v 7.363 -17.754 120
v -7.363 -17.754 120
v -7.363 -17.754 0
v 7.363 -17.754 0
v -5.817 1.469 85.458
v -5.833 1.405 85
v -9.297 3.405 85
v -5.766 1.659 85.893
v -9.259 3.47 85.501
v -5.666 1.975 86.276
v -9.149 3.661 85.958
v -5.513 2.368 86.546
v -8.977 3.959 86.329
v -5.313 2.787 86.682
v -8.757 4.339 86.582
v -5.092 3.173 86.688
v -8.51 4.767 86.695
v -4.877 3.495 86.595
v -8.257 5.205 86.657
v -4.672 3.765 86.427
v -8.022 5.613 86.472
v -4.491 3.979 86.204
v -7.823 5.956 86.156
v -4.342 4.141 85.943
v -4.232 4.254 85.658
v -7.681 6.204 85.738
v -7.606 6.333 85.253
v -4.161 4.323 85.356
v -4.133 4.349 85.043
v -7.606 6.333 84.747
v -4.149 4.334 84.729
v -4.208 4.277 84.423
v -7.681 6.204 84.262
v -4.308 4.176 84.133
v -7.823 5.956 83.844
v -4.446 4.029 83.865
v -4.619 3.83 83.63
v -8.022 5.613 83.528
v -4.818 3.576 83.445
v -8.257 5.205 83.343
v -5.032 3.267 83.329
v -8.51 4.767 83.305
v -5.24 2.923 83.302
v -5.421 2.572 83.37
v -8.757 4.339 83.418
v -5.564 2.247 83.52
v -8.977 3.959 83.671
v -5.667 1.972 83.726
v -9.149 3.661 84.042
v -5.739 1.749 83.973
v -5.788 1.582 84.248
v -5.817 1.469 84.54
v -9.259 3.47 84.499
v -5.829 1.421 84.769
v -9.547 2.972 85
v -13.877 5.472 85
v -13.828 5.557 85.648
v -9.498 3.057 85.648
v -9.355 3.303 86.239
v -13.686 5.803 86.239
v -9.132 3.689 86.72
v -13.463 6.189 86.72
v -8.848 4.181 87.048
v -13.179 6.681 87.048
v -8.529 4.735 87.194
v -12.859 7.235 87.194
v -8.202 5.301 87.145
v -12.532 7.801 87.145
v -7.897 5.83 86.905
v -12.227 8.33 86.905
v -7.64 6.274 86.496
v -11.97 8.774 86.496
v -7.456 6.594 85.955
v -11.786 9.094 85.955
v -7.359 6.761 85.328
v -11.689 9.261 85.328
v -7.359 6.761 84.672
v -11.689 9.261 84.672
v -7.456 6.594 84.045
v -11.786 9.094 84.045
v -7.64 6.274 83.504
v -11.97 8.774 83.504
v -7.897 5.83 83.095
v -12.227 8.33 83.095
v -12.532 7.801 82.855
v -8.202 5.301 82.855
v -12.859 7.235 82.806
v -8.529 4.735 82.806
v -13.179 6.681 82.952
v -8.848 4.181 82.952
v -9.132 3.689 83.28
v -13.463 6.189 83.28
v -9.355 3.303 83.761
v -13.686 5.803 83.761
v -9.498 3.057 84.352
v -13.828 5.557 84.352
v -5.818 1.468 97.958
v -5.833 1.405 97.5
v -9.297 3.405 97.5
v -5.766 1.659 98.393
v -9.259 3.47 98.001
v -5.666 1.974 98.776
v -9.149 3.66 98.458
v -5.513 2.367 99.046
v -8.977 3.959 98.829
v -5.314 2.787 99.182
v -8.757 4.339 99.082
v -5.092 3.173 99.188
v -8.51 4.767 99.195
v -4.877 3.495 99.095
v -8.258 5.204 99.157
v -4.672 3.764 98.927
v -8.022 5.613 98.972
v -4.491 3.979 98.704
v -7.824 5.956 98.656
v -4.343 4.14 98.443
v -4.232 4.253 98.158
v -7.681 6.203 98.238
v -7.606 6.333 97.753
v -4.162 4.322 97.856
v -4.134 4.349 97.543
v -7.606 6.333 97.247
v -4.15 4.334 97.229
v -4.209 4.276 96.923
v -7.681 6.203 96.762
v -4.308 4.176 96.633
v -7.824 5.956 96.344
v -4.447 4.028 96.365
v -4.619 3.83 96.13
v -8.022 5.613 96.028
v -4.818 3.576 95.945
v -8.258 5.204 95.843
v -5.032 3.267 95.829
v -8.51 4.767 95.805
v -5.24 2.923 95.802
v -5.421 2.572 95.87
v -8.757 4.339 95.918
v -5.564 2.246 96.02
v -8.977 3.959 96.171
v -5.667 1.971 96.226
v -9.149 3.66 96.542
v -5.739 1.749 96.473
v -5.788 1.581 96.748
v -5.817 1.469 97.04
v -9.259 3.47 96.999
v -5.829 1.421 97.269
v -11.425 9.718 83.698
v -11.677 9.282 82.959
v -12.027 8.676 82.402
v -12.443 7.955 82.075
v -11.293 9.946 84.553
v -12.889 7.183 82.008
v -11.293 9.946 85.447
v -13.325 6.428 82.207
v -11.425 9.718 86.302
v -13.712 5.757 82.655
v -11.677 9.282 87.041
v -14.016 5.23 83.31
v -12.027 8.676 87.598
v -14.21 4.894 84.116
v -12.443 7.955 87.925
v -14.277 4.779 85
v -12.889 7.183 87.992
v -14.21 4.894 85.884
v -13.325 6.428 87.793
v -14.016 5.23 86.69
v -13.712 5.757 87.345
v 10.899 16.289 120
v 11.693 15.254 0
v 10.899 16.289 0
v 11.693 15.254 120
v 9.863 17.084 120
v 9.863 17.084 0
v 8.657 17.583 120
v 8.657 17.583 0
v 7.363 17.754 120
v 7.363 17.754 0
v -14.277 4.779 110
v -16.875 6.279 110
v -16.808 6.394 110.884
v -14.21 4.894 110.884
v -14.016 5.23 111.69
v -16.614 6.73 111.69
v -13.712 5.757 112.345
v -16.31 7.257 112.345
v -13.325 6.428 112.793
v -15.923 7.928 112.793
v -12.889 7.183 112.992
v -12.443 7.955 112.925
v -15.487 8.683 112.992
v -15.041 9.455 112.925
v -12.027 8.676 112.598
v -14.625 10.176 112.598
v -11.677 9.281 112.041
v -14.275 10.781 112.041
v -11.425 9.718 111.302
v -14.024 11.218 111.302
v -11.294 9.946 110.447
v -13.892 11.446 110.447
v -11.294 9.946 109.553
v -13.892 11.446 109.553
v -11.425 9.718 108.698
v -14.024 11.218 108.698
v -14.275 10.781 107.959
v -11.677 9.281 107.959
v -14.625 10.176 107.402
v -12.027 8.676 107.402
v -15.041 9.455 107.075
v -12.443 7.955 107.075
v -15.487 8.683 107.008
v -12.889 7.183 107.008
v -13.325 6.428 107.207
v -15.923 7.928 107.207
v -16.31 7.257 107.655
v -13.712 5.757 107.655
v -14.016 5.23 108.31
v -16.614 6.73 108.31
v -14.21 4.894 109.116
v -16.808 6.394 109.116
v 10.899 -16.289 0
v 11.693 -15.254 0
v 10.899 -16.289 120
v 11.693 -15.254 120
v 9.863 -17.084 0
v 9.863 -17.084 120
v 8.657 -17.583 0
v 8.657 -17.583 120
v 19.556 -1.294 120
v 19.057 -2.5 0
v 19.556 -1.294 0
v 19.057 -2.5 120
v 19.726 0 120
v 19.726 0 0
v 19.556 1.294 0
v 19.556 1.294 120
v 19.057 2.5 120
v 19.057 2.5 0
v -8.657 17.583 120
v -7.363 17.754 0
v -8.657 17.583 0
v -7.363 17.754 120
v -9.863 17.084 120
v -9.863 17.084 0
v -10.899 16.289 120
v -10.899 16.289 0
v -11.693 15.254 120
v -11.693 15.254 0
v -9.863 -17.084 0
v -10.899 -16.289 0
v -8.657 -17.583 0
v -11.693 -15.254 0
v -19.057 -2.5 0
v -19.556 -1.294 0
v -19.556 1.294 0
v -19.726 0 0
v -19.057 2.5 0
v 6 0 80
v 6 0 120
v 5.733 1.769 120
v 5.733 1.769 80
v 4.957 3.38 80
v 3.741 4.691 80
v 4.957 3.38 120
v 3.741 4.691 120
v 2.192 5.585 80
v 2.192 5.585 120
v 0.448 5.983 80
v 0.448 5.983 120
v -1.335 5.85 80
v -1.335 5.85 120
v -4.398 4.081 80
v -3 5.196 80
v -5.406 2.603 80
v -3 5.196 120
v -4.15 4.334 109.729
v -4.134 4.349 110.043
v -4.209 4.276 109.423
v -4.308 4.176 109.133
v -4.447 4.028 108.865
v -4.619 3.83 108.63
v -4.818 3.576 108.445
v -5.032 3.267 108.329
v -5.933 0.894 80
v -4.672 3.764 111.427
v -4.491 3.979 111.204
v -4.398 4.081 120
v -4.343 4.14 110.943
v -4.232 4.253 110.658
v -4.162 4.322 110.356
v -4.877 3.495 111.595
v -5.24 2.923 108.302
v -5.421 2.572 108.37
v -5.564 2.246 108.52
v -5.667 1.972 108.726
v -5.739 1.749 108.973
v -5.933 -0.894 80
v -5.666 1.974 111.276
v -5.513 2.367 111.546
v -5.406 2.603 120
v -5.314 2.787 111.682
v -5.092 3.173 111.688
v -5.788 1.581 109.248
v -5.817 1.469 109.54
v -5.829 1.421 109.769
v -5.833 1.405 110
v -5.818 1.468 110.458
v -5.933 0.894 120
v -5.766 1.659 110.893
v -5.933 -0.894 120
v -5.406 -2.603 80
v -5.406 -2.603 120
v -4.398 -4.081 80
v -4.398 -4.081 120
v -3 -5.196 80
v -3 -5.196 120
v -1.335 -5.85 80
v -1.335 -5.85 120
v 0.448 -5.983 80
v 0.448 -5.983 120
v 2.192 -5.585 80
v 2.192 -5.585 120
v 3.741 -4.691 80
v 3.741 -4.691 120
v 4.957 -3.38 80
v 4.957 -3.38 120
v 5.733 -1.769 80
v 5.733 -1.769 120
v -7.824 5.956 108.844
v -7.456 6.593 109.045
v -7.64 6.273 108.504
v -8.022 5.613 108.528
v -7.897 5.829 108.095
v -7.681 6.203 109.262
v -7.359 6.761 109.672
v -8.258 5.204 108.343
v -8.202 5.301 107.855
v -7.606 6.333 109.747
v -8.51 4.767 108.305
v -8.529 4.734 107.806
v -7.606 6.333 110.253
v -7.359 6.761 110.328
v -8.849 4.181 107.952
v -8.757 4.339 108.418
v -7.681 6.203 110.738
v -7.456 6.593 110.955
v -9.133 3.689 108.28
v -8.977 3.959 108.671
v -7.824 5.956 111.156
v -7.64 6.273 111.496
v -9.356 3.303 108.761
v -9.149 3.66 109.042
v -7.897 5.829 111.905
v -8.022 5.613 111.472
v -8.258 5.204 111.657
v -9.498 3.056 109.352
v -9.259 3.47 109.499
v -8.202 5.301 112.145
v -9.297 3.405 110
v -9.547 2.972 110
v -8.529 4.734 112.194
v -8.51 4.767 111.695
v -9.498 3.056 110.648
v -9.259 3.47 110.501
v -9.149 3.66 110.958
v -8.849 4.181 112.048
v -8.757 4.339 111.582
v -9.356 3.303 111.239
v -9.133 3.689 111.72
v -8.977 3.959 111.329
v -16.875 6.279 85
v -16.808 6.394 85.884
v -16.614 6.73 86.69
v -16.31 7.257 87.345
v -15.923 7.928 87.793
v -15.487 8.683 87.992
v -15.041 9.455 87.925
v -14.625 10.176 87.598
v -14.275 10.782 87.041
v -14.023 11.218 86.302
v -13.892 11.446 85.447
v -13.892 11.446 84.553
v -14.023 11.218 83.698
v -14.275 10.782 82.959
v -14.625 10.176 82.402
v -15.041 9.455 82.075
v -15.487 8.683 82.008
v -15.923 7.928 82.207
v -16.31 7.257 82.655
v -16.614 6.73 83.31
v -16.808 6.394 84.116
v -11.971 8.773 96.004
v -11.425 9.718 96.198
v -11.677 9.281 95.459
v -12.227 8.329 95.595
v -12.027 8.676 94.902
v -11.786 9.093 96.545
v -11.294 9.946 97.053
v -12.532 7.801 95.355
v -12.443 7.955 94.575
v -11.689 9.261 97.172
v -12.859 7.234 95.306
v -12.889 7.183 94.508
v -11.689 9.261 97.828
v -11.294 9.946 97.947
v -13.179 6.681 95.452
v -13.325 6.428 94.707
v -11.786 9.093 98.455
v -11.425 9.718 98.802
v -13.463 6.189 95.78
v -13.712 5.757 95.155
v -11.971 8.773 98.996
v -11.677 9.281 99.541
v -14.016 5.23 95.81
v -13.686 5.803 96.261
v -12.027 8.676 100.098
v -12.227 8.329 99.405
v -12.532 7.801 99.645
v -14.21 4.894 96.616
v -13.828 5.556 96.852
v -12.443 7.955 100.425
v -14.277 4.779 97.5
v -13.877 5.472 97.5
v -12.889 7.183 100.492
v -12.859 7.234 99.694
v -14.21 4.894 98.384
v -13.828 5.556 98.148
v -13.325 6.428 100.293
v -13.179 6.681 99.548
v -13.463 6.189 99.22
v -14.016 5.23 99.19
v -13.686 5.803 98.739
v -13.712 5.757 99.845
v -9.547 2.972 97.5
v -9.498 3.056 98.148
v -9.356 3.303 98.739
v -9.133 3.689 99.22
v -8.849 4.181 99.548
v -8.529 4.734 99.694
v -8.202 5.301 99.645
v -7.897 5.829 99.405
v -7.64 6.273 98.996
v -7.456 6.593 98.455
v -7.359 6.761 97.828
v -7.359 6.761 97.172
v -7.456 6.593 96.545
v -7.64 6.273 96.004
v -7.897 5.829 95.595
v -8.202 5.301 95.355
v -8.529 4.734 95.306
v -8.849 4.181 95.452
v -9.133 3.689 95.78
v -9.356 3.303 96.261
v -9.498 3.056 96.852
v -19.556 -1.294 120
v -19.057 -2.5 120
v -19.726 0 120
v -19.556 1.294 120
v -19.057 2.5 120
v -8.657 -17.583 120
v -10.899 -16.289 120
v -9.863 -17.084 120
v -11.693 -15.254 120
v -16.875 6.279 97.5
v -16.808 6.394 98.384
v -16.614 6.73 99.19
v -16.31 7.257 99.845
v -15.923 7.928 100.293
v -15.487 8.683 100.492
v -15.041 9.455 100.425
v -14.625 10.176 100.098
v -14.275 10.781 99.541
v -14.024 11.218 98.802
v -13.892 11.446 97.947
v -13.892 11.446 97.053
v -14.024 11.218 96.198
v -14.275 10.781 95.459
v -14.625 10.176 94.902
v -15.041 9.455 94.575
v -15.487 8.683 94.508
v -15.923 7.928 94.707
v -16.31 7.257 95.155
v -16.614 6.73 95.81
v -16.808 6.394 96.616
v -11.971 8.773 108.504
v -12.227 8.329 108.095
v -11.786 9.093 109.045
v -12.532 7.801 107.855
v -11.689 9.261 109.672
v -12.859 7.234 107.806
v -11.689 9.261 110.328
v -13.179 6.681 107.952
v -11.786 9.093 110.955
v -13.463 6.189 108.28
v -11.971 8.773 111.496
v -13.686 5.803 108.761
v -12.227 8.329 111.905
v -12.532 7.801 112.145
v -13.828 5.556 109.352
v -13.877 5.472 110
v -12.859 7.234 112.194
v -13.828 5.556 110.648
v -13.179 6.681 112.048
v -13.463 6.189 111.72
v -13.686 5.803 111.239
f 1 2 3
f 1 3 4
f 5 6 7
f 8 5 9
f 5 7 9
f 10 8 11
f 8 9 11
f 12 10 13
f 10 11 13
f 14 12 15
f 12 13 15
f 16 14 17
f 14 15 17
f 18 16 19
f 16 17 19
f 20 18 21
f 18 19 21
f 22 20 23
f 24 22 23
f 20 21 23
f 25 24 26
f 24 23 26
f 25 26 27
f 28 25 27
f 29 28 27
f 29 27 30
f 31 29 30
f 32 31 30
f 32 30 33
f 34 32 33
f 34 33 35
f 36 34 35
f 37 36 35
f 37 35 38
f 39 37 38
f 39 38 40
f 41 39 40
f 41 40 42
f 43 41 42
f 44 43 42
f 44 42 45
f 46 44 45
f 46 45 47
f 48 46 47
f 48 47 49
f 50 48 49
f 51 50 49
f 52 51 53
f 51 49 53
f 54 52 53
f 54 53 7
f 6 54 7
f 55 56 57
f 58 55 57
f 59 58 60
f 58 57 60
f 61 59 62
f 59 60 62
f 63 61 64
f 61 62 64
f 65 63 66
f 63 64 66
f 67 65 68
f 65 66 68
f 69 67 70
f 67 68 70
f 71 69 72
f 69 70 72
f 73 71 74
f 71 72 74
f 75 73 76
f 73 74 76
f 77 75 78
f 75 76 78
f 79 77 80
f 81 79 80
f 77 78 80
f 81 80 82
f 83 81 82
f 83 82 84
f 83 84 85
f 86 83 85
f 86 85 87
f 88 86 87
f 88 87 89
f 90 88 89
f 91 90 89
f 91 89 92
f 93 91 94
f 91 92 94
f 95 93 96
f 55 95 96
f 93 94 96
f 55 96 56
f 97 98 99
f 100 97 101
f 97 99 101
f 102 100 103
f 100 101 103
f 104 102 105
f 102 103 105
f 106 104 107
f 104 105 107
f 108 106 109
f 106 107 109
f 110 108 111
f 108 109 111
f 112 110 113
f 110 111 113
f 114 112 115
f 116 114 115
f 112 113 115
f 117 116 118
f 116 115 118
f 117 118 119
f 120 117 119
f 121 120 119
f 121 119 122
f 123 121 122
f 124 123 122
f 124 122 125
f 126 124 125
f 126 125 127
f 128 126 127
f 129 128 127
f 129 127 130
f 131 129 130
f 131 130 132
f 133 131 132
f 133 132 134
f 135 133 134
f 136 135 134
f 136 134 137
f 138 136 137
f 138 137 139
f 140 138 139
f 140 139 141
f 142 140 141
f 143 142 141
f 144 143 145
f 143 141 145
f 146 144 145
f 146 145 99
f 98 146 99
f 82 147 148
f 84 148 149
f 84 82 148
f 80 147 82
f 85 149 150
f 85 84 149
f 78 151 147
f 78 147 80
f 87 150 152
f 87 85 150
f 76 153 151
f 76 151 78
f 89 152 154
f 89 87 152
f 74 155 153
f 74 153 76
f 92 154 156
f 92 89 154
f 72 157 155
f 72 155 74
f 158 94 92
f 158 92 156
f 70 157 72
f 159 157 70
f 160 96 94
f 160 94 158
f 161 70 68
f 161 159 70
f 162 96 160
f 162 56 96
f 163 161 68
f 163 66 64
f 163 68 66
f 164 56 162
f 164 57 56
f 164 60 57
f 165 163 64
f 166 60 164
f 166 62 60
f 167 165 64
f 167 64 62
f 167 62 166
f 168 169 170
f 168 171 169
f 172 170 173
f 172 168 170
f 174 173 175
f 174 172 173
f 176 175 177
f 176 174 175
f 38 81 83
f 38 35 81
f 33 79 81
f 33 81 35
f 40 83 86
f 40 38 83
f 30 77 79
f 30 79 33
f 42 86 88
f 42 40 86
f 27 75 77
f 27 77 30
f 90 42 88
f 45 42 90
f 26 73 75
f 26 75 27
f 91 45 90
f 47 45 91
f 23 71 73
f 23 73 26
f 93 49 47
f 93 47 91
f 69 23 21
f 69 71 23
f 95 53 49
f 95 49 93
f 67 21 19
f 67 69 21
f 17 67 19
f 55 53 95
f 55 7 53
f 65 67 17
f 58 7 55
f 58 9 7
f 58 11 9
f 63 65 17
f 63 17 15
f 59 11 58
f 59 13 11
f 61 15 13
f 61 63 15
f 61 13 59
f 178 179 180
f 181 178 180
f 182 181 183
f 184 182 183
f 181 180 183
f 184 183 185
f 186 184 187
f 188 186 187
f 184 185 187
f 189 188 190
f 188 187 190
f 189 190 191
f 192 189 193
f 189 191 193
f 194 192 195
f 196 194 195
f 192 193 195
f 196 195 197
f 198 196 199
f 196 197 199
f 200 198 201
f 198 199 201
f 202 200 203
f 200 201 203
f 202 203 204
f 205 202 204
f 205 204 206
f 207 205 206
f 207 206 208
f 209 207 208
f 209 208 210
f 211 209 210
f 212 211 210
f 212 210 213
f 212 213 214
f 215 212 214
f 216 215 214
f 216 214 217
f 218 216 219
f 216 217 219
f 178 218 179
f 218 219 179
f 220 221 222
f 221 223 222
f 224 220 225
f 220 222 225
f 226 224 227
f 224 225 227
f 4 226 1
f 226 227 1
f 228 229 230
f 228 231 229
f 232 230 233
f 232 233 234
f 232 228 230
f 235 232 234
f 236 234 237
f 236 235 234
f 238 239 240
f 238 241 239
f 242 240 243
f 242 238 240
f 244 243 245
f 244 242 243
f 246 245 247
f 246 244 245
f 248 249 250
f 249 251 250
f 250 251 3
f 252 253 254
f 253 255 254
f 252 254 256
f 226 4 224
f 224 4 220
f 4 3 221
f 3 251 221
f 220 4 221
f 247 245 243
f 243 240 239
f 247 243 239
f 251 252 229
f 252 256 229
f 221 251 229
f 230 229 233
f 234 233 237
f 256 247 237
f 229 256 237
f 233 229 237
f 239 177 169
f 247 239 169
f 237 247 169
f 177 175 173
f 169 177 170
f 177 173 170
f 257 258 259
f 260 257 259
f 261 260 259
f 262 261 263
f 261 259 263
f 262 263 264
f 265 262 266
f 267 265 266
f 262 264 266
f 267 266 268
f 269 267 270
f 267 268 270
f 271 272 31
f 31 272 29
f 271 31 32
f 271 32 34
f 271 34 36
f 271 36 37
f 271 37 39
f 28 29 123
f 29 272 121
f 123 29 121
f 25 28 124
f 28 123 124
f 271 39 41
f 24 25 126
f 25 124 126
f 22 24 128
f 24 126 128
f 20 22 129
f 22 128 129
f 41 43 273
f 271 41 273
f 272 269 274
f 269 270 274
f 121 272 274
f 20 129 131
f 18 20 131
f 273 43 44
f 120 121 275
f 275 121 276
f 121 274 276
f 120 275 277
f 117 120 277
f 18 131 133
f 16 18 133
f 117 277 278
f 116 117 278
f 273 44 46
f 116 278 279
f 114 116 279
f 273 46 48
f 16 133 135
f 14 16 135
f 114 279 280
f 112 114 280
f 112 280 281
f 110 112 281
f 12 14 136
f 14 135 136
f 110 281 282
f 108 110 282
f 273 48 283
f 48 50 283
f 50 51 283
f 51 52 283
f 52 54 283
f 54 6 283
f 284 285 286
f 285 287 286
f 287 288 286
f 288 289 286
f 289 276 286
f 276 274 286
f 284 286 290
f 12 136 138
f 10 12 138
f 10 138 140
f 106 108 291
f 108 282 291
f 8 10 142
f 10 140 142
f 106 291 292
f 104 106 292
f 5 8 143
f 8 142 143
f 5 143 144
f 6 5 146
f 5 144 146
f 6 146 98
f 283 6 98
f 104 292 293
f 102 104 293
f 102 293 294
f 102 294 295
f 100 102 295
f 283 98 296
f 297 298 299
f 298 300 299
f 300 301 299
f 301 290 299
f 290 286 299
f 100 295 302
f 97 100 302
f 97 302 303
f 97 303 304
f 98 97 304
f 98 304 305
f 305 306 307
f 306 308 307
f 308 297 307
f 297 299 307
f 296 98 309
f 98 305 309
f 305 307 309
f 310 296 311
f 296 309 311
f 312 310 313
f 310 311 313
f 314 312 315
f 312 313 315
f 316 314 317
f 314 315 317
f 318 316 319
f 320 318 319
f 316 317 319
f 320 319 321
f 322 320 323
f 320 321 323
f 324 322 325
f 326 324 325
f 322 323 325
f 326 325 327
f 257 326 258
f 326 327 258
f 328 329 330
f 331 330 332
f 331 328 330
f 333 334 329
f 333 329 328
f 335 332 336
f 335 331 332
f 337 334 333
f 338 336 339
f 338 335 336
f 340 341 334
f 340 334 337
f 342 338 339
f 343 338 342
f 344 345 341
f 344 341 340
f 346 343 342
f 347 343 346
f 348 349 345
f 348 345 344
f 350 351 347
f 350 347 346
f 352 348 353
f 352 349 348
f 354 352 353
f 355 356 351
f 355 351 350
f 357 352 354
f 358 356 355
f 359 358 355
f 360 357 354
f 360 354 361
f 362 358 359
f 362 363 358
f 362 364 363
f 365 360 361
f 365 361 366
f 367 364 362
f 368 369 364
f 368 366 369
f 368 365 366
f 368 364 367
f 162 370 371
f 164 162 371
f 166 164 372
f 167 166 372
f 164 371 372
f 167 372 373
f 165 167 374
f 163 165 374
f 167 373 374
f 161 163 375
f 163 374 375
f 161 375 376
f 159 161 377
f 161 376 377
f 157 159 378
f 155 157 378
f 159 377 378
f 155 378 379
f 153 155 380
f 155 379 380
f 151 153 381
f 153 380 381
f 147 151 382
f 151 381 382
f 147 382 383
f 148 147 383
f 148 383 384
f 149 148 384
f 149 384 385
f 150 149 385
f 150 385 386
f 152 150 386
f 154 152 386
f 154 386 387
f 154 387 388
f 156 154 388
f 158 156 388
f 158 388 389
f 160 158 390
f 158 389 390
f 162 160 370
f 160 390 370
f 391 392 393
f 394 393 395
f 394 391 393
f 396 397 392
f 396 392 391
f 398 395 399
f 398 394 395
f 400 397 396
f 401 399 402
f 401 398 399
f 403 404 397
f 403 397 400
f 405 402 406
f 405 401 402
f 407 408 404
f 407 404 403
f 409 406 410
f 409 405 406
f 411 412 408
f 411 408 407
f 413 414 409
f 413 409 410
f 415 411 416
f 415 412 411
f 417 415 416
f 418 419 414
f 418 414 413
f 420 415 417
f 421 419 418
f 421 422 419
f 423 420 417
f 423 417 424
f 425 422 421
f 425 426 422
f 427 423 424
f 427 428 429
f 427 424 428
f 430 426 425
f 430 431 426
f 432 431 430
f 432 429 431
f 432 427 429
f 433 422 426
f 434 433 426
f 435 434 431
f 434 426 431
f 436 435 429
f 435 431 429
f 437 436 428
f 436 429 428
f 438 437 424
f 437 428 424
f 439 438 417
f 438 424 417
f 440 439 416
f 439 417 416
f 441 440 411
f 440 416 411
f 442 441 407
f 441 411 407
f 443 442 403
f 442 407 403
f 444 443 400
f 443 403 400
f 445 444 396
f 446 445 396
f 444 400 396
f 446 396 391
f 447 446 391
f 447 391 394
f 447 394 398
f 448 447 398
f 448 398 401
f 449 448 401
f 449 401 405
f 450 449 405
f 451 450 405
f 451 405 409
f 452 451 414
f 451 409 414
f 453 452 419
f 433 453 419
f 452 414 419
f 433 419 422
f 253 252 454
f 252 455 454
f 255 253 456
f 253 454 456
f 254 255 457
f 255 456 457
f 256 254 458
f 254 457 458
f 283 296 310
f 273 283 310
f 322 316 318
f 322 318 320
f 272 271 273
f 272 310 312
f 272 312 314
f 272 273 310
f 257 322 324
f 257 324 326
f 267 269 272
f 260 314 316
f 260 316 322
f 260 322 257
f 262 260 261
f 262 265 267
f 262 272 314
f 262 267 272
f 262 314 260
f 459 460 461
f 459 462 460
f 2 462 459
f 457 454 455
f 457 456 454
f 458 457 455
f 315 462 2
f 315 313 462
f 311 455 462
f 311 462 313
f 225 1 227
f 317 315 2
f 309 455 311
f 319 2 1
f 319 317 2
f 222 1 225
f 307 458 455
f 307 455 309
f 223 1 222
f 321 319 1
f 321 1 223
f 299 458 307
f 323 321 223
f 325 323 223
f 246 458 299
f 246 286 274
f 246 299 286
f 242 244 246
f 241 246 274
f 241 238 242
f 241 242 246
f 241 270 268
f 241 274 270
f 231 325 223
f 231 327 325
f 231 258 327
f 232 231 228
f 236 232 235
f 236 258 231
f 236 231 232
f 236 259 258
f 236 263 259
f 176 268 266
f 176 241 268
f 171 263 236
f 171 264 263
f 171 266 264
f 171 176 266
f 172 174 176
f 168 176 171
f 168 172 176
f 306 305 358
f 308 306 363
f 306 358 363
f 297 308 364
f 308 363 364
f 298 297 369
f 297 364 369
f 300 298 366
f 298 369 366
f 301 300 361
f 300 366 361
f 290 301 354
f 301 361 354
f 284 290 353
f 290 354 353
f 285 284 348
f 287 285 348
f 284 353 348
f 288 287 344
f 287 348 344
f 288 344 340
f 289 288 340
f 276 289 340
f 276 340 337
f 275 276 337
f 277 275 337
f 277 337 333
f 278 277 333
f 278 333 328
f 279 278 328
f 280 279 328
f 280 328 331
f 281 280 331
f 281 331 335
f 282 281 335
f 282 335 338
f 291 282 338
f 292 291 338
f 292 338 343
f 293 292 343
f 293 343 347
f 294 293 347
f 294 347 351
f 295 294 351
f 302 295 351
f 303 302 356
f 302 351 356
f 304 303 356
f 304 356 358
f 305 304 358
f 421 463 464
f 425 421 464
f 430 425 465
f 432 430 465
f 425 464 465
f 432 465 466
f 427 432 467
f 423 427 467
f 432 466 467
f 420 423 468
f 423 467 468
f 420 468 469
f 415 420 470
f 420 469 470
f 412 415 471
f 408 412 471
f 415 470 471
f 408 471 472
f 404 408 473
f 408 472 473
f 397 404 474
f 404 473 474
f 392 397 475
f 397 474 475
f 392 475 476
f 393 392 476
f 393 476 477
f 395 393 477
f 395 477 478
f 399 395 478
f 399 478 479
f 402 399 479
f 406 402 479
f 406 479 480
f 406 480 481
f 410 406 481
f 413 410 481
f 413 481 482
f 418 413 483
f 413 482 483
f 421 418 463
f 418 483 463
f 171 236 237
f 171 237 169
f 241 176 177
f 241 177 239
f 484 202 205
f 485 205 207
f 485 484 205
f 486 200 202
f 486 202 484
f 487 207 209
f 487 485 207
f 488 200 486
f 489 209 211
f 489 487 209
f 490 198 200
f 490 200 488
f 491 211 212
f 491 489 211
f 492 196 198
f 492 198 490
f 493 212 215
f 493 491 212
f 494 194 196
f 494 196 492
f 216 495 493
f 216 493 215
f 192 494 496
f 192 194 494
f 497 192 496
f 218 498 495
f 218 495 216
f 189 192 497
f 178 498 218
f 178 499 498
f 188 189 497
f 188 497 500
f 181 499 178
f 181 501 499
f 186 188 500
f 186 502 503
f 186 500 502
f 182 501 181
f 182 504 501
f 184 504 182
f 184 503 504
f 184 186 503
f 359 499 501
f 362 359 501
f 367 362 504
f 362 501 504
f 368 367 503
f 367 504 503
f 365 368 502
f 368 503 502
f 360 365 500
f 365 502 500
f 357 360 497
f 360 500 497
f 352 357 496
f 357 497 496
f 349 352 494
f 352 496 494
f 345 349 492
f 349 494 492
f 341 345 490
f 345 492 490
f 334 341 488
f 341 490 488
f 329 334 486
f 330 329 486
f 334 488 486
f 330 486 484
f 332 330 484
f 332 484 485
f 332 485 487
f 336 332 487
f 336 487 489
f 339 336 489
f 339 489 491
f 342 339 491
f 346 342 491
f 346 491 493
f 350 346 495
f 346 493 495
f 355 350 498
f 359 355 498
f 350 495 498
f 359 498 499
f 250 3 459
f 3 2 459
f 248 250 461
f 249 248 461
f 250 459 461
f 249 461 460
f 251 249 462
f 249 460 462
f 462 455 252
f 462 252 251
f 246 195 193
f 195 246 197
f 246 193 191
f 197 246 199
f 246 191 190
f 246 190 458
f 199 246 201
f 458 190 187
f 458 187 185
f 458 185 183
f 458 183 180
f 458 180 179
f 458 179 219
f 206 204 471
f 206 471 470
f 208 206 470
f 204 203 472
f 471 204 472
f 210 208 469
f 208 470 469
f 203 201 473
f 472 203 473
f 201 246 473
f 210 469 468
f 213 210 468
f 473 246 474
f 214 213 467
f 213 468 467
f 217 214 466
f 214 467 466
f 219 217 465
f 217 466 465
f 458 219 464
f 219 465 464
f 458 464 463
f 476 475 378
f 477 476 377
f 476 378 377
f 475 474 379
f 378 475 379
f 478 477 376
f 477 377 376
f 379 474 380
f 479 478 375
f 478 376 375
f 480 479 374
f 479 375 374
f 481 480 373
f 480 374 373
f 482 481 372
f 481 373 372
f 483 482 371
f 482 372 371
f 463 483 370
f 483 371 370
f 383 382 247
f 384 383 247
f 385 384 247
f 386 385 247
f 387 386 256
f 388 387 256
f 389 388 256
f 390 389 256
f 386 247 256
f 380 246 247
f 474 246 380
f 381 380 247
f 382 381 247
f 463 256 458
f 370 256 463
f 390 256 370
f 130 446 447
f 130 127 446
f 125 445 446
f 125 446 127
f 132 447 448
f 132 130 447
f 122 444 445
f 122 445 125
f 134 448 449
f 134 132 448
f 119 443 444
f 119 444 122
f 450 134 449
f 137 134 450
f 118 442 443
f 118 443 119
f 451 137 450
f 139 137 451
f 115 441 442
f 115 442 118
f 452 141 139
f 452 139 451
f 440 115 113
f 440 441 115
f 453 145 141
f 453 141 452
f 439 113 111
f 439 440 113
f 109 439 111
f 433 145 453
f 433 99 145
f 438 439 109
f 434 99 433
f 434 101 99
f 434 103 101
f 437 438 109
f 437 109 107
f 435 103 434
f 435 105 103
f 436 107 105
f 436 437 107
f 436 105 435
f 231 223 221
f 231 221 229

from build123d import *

# Parameters (mm, degrees)
PAD_DEPTH       = 120
SKETCH001_R     = 6
POCKET_DEPTH    = 40
SKETCH002_R     = 1.7
POCKET001_DEPTH = 14
SKETCH003_R     = 3
POCKET002_DEPTH = 3
SKETCH004_R     = 2.2
POCKET003_DEPTH = 5
FILLET_R        = 5


with BuildPart() as part:
    # Sketch → Pad (new body)
    with BuildSketch(Plane.XY):
        Polygon((10.25, -17.7535207776), (20.5, 0), (10.25, 17.7535207776), (-10.25, 17.7535207776), (-20.5, 0), (-10.25, -17.7535207776), align=None)
    extrude(amount=PAD_DEPTH)

    # Sketch001 (on Face8 of Pad) → Pocket (cut)
    with BuildSketch(Plane.XY.offset(120)):
        Circle(SKETCH001_R)
    extrude(amount=-POCKET_DEPTH, mode=Mode.SUBTRACT)

    # Sketch002 (on Face8 of Pocket) → Pocket001 (cut)
    with BuildSketch(Plane(origin=(-15.375, 8.8767603888, 0), x_dir=(-0.5, -0.8660254038, 0), z_dir=(-0.8660254038, 0.5, 0))):
        with Locations((-3.77921e-05, 109.999999997)):
            Circle(SKETCH002_R)
        with Locations((0, 97.5)):
            Circle(SKETCH002_R)
        with Locations((-0.0004273495, 85)):
            Circle(SKETCH002_R)
    extrude(amount=-POCKET001_DEPTH, mode=Mode.SUBTRACT)

    # Sketch003 (on Face8 of Pocket001) → Pocket002 (cut)
    with BuildSketch(Plane(origin=(-15.375, 8.8767603888, 0), x_dir=(-0.5, -0.8660254038, 0), z_dir=(-0.8660254038, 0.5, 0))):
        with Locations((-0.0004273495, 85)):
            Circle(SKETCH003_R)
        with Locations((0, 97.5)):
            Circle(SKETCH003_R)
        with Locations((-3.77921e-05, 109.999999997)):
            Circle(SKETCH003_R)
    extrude(amount=-POCKET002_DEPTH, mode=Mode.SUBTRACT)

    # Sketch004 (on Face18 of Pocket002) → Pocket003 (cut)
    with BuildSketch(Plane(origin=(-12.7769237886, 7.3767603888, 0), x_dir=(-0.5, -0.8660254038, 0), z_dir=(-0.8660254038, 0.5, 0))):
        with Locations((-0.0004273495, 85)):
            Circle(SKETCH004_R)
        with Locations((-3.77921e-05, 109.999999997)):
            Circle(SKETCH004_R)
        with Locations((0, 97.5)):
            Circle(SKETCH004_R)
    extrude(amount=-POCKET003_DEPTH, mode=Mode.SUBTRACT)

    # Fillet
    fillet_edges = [part.edges().sort_by_distance(p)[0] for p in [
        (20.5, 0, 60),
        (-20.5, 0, 60),
        (10.25, -17.753521, 60),
        (-10.25, -17.753521, 60),
        (-10.25, 17.753521, 60),
        (10.25, 17.753521, 60),
    ]]
    fillet(fillet_edges, radius=FILLET_R)


solid = part.part
